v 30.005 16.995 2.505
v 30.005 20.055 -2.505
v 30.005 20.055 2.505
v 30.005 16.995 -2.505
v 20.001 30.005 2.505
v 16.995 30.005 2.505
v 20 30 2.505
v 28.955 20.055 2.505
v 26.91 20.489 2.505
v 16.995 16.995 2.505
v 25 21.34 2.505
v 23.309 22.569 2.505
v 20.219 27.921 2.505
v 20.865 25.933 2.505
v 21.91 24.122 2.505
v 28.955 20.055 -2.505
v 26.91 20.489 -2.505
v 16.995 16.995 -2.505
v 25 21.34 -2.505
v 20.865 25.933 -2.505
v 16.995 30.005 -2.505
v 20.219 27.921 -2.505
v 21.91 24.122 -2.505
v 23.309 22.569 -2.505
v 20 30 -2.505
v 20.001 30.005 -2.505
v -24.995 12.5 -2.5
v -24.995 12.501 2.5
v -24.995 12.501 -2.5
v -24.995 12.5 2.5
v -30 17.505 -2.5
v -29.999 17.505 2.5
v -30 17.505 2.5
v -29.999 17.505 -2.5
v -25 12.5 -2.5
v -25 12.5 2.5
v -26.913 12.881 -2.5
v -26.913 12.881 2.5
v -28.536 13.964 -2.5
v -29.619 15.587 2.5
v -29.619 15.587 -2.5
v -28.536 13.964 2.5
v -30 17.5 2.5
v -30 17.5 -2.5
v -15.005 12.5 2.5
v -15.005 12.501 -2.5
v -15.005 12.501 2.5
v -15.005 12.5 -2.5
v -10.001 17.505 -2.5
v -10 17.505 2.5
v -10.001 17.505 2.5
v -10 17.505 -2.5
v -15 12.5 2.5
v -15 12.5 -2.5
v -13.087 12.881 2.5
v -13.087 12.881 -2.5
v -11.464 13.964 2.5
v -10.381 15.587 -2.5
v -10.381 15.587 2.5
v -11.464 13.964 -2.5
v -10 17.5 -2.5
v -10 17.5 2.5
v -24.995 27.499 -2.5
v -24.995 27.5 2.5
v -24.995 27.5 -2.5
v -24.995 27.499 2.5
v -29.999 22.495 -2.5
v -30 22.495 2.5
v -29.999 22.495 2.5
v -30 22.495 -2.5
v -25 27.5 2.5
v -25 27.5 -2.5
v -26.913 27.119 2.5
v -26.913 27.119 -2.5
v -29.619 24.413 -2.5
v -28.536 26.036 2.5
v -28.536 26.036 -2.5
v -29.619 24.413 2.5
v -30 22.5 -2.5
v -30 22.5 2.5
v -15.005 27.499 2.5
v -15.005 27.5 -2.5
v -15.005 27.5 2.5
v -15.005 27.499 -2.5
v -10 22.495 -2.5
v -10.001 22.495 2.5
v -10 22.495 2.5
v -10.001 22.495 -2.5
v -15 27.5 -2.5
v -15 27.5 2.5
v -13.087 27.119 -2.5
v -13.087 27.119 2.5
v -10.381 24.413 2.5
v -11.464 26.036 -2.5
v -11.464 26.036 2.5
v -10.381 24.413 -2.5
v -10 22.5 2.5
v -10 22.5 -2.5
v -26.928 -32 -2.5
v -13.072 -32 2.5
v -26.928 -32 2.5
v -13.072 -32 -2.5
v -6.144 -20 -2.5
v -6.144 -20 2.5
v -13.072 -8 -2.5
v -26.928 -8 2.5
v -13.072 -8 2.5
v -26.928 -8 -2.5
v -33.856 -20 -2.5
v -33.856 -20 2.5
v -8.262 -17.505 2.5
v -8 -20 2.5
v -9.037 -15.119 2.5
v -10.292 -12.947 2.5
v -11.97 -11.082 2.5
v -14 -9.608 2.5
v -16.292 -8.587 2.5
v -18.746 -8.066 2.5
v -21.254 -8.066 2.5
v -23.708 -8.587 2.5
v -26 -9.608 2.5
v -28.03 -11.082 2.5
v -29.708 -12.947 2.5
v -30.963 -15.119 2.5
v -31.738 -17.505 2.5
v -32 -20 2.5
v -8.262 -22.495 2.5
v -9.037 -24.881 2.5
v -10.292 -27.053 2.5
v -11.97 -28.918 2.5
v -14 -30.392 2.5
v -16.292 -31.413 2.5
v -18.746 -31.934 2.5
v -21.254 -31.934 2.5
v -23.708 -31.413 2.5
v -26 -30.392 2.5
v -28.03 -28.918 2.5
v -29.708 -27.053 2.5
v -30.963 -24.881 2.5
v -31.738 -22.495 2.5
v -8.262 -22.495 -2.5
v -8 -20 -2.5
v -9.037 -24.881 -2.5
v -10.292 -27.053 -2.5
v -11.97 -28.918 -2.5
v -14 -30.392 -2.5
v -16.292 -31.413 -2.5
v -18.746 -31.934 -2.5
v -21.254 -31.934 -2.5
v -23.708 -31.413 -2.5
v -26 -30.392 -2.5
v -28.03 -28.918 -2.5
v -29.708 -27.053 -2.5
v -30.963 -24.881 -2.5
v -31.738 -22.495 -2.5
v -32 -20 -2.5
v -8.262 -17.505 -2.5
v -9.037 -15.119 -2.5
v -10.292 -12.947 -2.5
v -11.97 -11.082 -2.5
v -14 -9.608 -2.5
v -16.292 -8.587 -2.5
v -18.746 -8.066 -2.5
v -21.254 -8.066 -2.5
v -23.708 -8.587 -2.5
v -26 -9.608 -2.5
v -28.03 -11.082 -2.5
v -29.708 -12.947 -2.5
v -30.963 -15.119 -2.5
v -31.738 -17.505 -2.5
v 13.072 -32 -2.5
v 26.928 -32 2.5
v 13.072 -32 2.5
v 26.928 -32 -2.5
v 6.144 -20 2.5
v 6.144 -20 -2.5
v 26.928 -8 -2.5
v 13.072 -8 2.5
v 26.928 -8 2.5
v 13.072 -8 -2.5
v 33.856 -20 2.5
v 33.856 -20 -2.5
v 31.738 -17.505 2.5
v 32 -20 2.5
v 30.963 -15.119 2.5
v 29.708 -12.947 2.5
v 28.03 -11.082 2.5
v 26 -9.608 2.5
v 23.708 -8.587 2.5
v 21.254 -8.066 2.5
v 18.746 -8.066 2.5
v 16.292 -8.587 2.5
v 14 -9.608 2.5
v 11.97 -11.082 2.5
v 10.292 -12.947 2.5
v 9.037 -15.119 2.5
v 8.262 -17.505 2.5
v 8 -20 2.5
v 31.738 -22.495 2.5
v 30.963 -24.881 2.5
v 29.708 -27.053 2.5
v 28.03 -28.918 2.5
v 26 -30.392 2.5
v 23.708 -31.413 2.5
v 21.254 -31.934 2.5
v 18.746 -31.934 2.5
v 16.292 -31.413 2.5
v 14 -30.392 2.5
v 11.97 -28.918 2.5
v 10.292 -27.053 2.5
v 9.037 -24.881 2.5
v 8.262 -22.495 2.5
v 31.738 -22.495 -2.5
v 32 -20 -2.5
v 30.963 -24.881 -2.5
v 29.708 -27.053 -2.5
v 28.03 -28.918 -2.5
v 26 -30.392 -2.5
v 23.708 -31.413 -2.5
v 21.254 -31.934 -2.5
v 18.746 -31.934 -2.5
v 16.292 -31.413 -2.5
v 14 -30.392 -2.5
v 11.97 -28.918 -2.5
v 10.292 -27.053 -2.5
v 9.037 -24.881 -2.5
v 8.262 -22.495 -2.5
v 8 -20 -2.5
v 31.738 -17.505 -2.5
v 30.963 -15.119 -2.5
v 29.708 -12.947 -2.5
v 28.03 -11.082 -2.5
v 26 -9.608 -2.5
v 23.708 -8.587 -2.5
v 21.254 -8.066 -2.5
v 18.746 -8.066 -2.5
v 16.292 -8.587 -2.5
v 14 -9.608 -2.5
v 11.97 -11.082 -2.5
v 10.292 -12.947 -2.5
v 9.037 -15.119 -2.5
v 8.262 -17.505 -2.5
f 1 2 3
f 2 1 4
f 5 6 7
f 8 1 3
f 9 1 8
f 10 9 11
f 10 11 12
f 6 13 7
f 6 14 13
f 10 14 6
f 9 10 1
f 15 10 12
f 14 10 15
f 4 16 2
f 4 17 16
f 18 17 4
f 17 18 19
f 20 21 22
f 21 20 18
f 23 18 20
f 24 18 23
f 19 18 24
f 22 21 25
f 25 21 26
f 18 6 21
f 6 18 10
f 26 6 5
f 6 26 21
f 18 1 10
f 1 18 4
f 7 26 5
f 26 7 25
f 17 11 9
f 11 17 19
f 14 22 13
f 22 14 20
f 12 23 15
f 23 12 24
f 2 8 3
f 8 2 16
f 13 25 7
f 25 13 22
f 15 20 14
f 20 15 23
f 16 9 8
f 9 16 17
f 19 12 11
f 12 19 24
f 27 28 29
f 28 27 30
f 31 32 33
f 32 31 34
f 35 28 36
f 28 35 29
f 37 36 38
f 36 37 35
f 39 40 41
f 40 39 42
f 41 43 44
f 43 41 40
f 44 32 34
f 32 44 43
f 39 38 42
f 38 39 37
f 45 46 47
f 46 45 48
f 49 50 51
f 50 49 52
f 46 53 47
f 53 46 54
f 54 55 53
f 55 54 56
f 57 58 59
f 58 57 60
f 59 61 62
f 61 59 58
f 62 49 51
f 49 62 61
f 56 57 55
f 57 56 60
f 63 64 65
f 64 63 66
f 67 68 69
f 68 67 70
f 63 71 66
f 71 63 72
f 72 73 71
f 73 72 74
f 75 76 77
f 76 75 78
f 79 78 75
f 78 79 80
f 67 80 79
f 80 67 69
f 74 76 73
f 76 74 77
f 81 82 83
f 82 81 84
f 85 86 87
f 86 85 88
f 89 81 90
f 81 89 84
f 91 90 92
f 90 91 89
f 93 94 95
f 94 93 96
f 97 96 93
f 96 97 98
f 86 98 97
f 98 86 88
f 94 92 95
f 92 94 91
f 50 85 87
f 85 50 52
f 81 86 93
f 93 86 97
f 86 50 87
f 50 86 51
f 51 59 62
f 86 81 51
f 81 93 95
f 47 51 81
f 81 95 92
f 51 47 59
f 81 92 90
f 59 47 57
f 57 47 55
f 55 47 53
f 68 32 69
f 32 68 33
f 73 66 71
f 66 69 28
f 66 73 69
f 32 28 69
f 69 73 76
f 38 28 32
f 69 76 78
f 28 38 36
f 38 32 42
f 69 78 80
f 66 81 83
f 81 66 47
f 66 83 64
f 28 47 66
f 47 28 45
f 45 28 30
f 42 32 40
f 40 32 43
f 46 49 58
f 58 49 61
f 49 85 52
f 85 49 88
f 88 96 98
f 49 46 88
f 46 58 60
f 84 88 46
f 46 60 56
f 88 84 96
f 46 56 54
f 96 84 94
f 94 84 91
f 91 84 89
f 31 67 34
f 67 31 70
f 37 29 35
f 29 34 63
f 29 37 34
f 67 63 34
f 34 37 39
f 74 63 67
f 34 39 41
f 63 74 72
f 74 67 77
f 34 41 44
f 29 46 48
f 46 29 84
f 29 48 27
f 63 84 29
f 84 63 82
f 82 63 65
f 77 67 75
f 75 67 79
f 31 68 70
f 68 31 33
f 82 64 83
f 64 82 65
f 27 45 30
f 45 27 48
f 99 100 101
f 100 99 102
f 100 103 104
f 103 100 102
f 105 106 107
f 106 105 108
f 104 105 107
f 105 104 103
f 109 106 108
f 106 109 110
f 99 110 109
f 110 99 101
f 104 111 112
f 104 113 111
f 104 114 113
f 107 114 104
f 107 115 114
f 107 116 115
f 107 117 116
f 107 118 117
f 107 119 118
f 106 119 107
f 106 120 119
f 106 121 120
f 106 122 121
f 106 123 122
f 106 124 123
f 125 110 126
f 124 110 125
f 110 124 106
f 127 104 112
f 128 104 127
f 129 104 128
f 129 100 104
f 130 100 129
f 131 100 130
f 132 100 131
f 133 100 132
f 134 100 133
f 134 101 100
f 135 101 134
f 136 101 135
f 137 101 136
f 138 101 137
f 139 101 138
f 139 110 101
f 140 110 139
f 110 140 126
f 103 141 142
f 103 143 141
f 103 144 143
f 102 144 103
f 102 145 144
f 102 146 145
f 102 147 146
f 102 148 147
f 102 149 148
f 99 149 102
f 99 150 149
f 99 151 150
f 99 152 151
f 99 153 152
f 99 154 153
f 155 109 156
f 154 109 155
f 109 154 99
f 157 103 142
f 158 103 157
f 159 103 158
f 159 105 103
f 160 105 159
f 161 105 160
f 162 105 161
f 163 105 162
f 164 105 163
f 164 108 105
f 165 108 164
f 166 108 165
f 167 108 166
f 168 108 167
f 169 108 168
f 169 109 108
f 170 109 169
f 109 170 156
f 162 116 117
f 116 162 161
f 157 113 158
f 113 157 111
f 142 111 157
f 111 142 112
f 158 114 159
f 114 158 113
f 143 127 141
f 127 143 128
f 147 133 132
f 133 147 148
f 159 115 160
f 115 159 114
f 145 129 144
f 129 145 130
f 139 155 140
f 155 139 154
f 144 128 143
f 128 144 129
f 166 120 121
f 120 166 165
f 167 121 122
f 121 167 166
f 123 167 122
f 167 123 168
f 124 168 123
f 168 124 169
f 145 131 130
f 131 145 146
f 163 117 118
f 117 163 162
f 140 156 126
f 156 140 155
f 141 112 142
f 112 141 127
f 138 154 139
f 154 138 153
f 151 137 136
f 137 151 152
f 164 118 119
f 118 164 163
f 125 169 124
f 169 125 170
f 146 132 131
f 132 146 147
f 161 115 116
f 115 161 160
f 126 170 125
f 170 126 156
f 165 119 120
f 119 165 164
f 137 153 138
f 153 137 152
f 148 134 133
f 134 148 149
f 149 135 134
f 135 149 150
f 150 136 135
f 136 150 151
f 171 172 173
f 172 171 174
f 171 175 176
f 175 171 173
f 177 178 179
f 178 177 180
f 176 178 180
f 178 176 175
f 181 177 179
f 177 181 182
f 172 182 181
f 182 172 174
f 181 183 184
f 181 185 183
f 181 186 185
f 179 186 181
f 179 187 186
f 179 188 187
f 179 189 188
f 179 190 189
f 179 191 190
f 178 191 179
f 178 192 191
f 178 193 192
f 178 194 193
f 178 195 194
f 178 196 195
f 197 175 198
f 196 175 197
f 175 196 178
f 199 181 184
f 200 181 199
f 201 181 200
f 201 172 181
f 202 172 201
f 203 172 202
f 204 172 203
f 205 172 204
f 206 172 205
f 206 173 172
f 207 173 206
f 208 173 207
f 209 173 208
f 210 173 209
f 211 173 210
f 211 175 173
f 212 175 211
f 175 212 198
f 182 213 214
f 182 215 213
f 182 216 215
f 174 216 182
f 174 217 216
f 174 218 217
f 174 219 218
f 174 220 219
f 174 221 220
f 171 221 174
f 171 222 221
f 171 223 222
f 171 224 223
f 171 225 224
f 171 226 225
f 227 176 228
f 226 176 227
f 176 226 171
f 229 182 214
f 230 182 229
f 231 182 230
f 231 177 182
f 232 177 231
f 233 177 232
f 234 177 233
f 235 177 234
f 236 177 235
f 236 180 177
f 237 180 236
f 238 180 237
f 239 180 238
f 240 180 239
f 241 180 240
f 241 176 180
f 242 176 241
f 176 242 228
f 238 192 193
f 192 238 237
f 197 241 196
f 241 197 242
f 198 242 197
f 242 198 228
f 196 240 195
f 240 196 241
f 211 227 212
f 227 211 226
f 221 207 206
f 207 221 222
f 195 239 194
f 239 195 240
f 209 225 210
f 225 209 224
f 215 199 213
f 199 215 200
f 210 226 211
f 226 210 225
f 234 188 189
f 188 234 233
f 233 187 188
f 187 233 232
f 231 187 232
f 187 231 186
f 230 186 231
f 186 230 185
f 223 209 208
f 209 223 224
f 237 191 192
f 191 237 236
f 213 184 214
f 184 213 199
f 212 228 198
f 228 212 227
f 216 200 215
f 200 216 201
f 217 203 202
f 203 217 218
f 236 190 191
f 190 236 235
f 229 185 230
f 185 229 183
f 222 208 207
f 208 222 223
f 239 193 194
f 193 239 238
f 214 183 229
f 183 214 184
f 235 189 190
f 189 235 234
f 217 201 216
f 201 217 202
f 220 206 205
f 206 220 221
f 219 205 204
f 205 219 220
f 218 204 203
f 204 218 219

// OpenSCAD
// Same as mirror() but duplicates the children as opposed to just moving them.
module mirrored(v) {
  union() {
    children();
    mirror(v = v)
      children();
  } 
}

// Build a negative rounded corner to soften a square angle. Extra adds more
// material behind the rounded corner, which is sometimes useful to remove
// stuff.
module rounded_edge(radius, height, extra = 0) {
  translate([radius / 2, radius / 2, 0])
    difference() {
      translate([-extra/2, -extra/2, 0])
      cube([radius + .01 + extra, radius + .01 + extra, height + .01], center = true);
      translate([radius / 2, radius /2, 0])
        cylinder(r = radius, h = height + .02, center = true);
    }
}

// Build a cube with the corners in the z plane softened.
module rounded_cube(v, radius) {
  difference() {
    cube(v, center=true);
    mirrored([0, 1, 0]) mirrored([1, 0, 0])
      translate([-v[0]/2,-v[1]/2,0])
        rounded_edge(radius, v[2]);
  }
}

function number_of_circle_fragments(r) =
  $fn>0 ? ($fn >= 3 ? $fn : 3)
        : ceil(max(min(360 / $fa,
                       r * 2 * PI / $fs),
                   5));

// Build a cylinder garanteed to fit and element of the given radius. Aka, a
// little bit larger than a regular cylinder. Very useful with small fn.
module cylinder_outer(height,radius) {
  fn = number_of_circle_fragments(radius);
  fudge = 1 / cos(180 / fn);
  cylinder(h = height, r = radius * fudge, center = true);
}

// examples
translate([20, 20, 0]) rounded_edge(10, 5, 3);
translate([-20, 20, 0]) rounded_cube([20,15,5], 5);
mirrored([1, 0, 0]) translate([-20, -20, 0])difference() {
  cylinder_outer(5, 12, $fn = 6);
  cylinder(h = 6, r = 12, center = true);
}
